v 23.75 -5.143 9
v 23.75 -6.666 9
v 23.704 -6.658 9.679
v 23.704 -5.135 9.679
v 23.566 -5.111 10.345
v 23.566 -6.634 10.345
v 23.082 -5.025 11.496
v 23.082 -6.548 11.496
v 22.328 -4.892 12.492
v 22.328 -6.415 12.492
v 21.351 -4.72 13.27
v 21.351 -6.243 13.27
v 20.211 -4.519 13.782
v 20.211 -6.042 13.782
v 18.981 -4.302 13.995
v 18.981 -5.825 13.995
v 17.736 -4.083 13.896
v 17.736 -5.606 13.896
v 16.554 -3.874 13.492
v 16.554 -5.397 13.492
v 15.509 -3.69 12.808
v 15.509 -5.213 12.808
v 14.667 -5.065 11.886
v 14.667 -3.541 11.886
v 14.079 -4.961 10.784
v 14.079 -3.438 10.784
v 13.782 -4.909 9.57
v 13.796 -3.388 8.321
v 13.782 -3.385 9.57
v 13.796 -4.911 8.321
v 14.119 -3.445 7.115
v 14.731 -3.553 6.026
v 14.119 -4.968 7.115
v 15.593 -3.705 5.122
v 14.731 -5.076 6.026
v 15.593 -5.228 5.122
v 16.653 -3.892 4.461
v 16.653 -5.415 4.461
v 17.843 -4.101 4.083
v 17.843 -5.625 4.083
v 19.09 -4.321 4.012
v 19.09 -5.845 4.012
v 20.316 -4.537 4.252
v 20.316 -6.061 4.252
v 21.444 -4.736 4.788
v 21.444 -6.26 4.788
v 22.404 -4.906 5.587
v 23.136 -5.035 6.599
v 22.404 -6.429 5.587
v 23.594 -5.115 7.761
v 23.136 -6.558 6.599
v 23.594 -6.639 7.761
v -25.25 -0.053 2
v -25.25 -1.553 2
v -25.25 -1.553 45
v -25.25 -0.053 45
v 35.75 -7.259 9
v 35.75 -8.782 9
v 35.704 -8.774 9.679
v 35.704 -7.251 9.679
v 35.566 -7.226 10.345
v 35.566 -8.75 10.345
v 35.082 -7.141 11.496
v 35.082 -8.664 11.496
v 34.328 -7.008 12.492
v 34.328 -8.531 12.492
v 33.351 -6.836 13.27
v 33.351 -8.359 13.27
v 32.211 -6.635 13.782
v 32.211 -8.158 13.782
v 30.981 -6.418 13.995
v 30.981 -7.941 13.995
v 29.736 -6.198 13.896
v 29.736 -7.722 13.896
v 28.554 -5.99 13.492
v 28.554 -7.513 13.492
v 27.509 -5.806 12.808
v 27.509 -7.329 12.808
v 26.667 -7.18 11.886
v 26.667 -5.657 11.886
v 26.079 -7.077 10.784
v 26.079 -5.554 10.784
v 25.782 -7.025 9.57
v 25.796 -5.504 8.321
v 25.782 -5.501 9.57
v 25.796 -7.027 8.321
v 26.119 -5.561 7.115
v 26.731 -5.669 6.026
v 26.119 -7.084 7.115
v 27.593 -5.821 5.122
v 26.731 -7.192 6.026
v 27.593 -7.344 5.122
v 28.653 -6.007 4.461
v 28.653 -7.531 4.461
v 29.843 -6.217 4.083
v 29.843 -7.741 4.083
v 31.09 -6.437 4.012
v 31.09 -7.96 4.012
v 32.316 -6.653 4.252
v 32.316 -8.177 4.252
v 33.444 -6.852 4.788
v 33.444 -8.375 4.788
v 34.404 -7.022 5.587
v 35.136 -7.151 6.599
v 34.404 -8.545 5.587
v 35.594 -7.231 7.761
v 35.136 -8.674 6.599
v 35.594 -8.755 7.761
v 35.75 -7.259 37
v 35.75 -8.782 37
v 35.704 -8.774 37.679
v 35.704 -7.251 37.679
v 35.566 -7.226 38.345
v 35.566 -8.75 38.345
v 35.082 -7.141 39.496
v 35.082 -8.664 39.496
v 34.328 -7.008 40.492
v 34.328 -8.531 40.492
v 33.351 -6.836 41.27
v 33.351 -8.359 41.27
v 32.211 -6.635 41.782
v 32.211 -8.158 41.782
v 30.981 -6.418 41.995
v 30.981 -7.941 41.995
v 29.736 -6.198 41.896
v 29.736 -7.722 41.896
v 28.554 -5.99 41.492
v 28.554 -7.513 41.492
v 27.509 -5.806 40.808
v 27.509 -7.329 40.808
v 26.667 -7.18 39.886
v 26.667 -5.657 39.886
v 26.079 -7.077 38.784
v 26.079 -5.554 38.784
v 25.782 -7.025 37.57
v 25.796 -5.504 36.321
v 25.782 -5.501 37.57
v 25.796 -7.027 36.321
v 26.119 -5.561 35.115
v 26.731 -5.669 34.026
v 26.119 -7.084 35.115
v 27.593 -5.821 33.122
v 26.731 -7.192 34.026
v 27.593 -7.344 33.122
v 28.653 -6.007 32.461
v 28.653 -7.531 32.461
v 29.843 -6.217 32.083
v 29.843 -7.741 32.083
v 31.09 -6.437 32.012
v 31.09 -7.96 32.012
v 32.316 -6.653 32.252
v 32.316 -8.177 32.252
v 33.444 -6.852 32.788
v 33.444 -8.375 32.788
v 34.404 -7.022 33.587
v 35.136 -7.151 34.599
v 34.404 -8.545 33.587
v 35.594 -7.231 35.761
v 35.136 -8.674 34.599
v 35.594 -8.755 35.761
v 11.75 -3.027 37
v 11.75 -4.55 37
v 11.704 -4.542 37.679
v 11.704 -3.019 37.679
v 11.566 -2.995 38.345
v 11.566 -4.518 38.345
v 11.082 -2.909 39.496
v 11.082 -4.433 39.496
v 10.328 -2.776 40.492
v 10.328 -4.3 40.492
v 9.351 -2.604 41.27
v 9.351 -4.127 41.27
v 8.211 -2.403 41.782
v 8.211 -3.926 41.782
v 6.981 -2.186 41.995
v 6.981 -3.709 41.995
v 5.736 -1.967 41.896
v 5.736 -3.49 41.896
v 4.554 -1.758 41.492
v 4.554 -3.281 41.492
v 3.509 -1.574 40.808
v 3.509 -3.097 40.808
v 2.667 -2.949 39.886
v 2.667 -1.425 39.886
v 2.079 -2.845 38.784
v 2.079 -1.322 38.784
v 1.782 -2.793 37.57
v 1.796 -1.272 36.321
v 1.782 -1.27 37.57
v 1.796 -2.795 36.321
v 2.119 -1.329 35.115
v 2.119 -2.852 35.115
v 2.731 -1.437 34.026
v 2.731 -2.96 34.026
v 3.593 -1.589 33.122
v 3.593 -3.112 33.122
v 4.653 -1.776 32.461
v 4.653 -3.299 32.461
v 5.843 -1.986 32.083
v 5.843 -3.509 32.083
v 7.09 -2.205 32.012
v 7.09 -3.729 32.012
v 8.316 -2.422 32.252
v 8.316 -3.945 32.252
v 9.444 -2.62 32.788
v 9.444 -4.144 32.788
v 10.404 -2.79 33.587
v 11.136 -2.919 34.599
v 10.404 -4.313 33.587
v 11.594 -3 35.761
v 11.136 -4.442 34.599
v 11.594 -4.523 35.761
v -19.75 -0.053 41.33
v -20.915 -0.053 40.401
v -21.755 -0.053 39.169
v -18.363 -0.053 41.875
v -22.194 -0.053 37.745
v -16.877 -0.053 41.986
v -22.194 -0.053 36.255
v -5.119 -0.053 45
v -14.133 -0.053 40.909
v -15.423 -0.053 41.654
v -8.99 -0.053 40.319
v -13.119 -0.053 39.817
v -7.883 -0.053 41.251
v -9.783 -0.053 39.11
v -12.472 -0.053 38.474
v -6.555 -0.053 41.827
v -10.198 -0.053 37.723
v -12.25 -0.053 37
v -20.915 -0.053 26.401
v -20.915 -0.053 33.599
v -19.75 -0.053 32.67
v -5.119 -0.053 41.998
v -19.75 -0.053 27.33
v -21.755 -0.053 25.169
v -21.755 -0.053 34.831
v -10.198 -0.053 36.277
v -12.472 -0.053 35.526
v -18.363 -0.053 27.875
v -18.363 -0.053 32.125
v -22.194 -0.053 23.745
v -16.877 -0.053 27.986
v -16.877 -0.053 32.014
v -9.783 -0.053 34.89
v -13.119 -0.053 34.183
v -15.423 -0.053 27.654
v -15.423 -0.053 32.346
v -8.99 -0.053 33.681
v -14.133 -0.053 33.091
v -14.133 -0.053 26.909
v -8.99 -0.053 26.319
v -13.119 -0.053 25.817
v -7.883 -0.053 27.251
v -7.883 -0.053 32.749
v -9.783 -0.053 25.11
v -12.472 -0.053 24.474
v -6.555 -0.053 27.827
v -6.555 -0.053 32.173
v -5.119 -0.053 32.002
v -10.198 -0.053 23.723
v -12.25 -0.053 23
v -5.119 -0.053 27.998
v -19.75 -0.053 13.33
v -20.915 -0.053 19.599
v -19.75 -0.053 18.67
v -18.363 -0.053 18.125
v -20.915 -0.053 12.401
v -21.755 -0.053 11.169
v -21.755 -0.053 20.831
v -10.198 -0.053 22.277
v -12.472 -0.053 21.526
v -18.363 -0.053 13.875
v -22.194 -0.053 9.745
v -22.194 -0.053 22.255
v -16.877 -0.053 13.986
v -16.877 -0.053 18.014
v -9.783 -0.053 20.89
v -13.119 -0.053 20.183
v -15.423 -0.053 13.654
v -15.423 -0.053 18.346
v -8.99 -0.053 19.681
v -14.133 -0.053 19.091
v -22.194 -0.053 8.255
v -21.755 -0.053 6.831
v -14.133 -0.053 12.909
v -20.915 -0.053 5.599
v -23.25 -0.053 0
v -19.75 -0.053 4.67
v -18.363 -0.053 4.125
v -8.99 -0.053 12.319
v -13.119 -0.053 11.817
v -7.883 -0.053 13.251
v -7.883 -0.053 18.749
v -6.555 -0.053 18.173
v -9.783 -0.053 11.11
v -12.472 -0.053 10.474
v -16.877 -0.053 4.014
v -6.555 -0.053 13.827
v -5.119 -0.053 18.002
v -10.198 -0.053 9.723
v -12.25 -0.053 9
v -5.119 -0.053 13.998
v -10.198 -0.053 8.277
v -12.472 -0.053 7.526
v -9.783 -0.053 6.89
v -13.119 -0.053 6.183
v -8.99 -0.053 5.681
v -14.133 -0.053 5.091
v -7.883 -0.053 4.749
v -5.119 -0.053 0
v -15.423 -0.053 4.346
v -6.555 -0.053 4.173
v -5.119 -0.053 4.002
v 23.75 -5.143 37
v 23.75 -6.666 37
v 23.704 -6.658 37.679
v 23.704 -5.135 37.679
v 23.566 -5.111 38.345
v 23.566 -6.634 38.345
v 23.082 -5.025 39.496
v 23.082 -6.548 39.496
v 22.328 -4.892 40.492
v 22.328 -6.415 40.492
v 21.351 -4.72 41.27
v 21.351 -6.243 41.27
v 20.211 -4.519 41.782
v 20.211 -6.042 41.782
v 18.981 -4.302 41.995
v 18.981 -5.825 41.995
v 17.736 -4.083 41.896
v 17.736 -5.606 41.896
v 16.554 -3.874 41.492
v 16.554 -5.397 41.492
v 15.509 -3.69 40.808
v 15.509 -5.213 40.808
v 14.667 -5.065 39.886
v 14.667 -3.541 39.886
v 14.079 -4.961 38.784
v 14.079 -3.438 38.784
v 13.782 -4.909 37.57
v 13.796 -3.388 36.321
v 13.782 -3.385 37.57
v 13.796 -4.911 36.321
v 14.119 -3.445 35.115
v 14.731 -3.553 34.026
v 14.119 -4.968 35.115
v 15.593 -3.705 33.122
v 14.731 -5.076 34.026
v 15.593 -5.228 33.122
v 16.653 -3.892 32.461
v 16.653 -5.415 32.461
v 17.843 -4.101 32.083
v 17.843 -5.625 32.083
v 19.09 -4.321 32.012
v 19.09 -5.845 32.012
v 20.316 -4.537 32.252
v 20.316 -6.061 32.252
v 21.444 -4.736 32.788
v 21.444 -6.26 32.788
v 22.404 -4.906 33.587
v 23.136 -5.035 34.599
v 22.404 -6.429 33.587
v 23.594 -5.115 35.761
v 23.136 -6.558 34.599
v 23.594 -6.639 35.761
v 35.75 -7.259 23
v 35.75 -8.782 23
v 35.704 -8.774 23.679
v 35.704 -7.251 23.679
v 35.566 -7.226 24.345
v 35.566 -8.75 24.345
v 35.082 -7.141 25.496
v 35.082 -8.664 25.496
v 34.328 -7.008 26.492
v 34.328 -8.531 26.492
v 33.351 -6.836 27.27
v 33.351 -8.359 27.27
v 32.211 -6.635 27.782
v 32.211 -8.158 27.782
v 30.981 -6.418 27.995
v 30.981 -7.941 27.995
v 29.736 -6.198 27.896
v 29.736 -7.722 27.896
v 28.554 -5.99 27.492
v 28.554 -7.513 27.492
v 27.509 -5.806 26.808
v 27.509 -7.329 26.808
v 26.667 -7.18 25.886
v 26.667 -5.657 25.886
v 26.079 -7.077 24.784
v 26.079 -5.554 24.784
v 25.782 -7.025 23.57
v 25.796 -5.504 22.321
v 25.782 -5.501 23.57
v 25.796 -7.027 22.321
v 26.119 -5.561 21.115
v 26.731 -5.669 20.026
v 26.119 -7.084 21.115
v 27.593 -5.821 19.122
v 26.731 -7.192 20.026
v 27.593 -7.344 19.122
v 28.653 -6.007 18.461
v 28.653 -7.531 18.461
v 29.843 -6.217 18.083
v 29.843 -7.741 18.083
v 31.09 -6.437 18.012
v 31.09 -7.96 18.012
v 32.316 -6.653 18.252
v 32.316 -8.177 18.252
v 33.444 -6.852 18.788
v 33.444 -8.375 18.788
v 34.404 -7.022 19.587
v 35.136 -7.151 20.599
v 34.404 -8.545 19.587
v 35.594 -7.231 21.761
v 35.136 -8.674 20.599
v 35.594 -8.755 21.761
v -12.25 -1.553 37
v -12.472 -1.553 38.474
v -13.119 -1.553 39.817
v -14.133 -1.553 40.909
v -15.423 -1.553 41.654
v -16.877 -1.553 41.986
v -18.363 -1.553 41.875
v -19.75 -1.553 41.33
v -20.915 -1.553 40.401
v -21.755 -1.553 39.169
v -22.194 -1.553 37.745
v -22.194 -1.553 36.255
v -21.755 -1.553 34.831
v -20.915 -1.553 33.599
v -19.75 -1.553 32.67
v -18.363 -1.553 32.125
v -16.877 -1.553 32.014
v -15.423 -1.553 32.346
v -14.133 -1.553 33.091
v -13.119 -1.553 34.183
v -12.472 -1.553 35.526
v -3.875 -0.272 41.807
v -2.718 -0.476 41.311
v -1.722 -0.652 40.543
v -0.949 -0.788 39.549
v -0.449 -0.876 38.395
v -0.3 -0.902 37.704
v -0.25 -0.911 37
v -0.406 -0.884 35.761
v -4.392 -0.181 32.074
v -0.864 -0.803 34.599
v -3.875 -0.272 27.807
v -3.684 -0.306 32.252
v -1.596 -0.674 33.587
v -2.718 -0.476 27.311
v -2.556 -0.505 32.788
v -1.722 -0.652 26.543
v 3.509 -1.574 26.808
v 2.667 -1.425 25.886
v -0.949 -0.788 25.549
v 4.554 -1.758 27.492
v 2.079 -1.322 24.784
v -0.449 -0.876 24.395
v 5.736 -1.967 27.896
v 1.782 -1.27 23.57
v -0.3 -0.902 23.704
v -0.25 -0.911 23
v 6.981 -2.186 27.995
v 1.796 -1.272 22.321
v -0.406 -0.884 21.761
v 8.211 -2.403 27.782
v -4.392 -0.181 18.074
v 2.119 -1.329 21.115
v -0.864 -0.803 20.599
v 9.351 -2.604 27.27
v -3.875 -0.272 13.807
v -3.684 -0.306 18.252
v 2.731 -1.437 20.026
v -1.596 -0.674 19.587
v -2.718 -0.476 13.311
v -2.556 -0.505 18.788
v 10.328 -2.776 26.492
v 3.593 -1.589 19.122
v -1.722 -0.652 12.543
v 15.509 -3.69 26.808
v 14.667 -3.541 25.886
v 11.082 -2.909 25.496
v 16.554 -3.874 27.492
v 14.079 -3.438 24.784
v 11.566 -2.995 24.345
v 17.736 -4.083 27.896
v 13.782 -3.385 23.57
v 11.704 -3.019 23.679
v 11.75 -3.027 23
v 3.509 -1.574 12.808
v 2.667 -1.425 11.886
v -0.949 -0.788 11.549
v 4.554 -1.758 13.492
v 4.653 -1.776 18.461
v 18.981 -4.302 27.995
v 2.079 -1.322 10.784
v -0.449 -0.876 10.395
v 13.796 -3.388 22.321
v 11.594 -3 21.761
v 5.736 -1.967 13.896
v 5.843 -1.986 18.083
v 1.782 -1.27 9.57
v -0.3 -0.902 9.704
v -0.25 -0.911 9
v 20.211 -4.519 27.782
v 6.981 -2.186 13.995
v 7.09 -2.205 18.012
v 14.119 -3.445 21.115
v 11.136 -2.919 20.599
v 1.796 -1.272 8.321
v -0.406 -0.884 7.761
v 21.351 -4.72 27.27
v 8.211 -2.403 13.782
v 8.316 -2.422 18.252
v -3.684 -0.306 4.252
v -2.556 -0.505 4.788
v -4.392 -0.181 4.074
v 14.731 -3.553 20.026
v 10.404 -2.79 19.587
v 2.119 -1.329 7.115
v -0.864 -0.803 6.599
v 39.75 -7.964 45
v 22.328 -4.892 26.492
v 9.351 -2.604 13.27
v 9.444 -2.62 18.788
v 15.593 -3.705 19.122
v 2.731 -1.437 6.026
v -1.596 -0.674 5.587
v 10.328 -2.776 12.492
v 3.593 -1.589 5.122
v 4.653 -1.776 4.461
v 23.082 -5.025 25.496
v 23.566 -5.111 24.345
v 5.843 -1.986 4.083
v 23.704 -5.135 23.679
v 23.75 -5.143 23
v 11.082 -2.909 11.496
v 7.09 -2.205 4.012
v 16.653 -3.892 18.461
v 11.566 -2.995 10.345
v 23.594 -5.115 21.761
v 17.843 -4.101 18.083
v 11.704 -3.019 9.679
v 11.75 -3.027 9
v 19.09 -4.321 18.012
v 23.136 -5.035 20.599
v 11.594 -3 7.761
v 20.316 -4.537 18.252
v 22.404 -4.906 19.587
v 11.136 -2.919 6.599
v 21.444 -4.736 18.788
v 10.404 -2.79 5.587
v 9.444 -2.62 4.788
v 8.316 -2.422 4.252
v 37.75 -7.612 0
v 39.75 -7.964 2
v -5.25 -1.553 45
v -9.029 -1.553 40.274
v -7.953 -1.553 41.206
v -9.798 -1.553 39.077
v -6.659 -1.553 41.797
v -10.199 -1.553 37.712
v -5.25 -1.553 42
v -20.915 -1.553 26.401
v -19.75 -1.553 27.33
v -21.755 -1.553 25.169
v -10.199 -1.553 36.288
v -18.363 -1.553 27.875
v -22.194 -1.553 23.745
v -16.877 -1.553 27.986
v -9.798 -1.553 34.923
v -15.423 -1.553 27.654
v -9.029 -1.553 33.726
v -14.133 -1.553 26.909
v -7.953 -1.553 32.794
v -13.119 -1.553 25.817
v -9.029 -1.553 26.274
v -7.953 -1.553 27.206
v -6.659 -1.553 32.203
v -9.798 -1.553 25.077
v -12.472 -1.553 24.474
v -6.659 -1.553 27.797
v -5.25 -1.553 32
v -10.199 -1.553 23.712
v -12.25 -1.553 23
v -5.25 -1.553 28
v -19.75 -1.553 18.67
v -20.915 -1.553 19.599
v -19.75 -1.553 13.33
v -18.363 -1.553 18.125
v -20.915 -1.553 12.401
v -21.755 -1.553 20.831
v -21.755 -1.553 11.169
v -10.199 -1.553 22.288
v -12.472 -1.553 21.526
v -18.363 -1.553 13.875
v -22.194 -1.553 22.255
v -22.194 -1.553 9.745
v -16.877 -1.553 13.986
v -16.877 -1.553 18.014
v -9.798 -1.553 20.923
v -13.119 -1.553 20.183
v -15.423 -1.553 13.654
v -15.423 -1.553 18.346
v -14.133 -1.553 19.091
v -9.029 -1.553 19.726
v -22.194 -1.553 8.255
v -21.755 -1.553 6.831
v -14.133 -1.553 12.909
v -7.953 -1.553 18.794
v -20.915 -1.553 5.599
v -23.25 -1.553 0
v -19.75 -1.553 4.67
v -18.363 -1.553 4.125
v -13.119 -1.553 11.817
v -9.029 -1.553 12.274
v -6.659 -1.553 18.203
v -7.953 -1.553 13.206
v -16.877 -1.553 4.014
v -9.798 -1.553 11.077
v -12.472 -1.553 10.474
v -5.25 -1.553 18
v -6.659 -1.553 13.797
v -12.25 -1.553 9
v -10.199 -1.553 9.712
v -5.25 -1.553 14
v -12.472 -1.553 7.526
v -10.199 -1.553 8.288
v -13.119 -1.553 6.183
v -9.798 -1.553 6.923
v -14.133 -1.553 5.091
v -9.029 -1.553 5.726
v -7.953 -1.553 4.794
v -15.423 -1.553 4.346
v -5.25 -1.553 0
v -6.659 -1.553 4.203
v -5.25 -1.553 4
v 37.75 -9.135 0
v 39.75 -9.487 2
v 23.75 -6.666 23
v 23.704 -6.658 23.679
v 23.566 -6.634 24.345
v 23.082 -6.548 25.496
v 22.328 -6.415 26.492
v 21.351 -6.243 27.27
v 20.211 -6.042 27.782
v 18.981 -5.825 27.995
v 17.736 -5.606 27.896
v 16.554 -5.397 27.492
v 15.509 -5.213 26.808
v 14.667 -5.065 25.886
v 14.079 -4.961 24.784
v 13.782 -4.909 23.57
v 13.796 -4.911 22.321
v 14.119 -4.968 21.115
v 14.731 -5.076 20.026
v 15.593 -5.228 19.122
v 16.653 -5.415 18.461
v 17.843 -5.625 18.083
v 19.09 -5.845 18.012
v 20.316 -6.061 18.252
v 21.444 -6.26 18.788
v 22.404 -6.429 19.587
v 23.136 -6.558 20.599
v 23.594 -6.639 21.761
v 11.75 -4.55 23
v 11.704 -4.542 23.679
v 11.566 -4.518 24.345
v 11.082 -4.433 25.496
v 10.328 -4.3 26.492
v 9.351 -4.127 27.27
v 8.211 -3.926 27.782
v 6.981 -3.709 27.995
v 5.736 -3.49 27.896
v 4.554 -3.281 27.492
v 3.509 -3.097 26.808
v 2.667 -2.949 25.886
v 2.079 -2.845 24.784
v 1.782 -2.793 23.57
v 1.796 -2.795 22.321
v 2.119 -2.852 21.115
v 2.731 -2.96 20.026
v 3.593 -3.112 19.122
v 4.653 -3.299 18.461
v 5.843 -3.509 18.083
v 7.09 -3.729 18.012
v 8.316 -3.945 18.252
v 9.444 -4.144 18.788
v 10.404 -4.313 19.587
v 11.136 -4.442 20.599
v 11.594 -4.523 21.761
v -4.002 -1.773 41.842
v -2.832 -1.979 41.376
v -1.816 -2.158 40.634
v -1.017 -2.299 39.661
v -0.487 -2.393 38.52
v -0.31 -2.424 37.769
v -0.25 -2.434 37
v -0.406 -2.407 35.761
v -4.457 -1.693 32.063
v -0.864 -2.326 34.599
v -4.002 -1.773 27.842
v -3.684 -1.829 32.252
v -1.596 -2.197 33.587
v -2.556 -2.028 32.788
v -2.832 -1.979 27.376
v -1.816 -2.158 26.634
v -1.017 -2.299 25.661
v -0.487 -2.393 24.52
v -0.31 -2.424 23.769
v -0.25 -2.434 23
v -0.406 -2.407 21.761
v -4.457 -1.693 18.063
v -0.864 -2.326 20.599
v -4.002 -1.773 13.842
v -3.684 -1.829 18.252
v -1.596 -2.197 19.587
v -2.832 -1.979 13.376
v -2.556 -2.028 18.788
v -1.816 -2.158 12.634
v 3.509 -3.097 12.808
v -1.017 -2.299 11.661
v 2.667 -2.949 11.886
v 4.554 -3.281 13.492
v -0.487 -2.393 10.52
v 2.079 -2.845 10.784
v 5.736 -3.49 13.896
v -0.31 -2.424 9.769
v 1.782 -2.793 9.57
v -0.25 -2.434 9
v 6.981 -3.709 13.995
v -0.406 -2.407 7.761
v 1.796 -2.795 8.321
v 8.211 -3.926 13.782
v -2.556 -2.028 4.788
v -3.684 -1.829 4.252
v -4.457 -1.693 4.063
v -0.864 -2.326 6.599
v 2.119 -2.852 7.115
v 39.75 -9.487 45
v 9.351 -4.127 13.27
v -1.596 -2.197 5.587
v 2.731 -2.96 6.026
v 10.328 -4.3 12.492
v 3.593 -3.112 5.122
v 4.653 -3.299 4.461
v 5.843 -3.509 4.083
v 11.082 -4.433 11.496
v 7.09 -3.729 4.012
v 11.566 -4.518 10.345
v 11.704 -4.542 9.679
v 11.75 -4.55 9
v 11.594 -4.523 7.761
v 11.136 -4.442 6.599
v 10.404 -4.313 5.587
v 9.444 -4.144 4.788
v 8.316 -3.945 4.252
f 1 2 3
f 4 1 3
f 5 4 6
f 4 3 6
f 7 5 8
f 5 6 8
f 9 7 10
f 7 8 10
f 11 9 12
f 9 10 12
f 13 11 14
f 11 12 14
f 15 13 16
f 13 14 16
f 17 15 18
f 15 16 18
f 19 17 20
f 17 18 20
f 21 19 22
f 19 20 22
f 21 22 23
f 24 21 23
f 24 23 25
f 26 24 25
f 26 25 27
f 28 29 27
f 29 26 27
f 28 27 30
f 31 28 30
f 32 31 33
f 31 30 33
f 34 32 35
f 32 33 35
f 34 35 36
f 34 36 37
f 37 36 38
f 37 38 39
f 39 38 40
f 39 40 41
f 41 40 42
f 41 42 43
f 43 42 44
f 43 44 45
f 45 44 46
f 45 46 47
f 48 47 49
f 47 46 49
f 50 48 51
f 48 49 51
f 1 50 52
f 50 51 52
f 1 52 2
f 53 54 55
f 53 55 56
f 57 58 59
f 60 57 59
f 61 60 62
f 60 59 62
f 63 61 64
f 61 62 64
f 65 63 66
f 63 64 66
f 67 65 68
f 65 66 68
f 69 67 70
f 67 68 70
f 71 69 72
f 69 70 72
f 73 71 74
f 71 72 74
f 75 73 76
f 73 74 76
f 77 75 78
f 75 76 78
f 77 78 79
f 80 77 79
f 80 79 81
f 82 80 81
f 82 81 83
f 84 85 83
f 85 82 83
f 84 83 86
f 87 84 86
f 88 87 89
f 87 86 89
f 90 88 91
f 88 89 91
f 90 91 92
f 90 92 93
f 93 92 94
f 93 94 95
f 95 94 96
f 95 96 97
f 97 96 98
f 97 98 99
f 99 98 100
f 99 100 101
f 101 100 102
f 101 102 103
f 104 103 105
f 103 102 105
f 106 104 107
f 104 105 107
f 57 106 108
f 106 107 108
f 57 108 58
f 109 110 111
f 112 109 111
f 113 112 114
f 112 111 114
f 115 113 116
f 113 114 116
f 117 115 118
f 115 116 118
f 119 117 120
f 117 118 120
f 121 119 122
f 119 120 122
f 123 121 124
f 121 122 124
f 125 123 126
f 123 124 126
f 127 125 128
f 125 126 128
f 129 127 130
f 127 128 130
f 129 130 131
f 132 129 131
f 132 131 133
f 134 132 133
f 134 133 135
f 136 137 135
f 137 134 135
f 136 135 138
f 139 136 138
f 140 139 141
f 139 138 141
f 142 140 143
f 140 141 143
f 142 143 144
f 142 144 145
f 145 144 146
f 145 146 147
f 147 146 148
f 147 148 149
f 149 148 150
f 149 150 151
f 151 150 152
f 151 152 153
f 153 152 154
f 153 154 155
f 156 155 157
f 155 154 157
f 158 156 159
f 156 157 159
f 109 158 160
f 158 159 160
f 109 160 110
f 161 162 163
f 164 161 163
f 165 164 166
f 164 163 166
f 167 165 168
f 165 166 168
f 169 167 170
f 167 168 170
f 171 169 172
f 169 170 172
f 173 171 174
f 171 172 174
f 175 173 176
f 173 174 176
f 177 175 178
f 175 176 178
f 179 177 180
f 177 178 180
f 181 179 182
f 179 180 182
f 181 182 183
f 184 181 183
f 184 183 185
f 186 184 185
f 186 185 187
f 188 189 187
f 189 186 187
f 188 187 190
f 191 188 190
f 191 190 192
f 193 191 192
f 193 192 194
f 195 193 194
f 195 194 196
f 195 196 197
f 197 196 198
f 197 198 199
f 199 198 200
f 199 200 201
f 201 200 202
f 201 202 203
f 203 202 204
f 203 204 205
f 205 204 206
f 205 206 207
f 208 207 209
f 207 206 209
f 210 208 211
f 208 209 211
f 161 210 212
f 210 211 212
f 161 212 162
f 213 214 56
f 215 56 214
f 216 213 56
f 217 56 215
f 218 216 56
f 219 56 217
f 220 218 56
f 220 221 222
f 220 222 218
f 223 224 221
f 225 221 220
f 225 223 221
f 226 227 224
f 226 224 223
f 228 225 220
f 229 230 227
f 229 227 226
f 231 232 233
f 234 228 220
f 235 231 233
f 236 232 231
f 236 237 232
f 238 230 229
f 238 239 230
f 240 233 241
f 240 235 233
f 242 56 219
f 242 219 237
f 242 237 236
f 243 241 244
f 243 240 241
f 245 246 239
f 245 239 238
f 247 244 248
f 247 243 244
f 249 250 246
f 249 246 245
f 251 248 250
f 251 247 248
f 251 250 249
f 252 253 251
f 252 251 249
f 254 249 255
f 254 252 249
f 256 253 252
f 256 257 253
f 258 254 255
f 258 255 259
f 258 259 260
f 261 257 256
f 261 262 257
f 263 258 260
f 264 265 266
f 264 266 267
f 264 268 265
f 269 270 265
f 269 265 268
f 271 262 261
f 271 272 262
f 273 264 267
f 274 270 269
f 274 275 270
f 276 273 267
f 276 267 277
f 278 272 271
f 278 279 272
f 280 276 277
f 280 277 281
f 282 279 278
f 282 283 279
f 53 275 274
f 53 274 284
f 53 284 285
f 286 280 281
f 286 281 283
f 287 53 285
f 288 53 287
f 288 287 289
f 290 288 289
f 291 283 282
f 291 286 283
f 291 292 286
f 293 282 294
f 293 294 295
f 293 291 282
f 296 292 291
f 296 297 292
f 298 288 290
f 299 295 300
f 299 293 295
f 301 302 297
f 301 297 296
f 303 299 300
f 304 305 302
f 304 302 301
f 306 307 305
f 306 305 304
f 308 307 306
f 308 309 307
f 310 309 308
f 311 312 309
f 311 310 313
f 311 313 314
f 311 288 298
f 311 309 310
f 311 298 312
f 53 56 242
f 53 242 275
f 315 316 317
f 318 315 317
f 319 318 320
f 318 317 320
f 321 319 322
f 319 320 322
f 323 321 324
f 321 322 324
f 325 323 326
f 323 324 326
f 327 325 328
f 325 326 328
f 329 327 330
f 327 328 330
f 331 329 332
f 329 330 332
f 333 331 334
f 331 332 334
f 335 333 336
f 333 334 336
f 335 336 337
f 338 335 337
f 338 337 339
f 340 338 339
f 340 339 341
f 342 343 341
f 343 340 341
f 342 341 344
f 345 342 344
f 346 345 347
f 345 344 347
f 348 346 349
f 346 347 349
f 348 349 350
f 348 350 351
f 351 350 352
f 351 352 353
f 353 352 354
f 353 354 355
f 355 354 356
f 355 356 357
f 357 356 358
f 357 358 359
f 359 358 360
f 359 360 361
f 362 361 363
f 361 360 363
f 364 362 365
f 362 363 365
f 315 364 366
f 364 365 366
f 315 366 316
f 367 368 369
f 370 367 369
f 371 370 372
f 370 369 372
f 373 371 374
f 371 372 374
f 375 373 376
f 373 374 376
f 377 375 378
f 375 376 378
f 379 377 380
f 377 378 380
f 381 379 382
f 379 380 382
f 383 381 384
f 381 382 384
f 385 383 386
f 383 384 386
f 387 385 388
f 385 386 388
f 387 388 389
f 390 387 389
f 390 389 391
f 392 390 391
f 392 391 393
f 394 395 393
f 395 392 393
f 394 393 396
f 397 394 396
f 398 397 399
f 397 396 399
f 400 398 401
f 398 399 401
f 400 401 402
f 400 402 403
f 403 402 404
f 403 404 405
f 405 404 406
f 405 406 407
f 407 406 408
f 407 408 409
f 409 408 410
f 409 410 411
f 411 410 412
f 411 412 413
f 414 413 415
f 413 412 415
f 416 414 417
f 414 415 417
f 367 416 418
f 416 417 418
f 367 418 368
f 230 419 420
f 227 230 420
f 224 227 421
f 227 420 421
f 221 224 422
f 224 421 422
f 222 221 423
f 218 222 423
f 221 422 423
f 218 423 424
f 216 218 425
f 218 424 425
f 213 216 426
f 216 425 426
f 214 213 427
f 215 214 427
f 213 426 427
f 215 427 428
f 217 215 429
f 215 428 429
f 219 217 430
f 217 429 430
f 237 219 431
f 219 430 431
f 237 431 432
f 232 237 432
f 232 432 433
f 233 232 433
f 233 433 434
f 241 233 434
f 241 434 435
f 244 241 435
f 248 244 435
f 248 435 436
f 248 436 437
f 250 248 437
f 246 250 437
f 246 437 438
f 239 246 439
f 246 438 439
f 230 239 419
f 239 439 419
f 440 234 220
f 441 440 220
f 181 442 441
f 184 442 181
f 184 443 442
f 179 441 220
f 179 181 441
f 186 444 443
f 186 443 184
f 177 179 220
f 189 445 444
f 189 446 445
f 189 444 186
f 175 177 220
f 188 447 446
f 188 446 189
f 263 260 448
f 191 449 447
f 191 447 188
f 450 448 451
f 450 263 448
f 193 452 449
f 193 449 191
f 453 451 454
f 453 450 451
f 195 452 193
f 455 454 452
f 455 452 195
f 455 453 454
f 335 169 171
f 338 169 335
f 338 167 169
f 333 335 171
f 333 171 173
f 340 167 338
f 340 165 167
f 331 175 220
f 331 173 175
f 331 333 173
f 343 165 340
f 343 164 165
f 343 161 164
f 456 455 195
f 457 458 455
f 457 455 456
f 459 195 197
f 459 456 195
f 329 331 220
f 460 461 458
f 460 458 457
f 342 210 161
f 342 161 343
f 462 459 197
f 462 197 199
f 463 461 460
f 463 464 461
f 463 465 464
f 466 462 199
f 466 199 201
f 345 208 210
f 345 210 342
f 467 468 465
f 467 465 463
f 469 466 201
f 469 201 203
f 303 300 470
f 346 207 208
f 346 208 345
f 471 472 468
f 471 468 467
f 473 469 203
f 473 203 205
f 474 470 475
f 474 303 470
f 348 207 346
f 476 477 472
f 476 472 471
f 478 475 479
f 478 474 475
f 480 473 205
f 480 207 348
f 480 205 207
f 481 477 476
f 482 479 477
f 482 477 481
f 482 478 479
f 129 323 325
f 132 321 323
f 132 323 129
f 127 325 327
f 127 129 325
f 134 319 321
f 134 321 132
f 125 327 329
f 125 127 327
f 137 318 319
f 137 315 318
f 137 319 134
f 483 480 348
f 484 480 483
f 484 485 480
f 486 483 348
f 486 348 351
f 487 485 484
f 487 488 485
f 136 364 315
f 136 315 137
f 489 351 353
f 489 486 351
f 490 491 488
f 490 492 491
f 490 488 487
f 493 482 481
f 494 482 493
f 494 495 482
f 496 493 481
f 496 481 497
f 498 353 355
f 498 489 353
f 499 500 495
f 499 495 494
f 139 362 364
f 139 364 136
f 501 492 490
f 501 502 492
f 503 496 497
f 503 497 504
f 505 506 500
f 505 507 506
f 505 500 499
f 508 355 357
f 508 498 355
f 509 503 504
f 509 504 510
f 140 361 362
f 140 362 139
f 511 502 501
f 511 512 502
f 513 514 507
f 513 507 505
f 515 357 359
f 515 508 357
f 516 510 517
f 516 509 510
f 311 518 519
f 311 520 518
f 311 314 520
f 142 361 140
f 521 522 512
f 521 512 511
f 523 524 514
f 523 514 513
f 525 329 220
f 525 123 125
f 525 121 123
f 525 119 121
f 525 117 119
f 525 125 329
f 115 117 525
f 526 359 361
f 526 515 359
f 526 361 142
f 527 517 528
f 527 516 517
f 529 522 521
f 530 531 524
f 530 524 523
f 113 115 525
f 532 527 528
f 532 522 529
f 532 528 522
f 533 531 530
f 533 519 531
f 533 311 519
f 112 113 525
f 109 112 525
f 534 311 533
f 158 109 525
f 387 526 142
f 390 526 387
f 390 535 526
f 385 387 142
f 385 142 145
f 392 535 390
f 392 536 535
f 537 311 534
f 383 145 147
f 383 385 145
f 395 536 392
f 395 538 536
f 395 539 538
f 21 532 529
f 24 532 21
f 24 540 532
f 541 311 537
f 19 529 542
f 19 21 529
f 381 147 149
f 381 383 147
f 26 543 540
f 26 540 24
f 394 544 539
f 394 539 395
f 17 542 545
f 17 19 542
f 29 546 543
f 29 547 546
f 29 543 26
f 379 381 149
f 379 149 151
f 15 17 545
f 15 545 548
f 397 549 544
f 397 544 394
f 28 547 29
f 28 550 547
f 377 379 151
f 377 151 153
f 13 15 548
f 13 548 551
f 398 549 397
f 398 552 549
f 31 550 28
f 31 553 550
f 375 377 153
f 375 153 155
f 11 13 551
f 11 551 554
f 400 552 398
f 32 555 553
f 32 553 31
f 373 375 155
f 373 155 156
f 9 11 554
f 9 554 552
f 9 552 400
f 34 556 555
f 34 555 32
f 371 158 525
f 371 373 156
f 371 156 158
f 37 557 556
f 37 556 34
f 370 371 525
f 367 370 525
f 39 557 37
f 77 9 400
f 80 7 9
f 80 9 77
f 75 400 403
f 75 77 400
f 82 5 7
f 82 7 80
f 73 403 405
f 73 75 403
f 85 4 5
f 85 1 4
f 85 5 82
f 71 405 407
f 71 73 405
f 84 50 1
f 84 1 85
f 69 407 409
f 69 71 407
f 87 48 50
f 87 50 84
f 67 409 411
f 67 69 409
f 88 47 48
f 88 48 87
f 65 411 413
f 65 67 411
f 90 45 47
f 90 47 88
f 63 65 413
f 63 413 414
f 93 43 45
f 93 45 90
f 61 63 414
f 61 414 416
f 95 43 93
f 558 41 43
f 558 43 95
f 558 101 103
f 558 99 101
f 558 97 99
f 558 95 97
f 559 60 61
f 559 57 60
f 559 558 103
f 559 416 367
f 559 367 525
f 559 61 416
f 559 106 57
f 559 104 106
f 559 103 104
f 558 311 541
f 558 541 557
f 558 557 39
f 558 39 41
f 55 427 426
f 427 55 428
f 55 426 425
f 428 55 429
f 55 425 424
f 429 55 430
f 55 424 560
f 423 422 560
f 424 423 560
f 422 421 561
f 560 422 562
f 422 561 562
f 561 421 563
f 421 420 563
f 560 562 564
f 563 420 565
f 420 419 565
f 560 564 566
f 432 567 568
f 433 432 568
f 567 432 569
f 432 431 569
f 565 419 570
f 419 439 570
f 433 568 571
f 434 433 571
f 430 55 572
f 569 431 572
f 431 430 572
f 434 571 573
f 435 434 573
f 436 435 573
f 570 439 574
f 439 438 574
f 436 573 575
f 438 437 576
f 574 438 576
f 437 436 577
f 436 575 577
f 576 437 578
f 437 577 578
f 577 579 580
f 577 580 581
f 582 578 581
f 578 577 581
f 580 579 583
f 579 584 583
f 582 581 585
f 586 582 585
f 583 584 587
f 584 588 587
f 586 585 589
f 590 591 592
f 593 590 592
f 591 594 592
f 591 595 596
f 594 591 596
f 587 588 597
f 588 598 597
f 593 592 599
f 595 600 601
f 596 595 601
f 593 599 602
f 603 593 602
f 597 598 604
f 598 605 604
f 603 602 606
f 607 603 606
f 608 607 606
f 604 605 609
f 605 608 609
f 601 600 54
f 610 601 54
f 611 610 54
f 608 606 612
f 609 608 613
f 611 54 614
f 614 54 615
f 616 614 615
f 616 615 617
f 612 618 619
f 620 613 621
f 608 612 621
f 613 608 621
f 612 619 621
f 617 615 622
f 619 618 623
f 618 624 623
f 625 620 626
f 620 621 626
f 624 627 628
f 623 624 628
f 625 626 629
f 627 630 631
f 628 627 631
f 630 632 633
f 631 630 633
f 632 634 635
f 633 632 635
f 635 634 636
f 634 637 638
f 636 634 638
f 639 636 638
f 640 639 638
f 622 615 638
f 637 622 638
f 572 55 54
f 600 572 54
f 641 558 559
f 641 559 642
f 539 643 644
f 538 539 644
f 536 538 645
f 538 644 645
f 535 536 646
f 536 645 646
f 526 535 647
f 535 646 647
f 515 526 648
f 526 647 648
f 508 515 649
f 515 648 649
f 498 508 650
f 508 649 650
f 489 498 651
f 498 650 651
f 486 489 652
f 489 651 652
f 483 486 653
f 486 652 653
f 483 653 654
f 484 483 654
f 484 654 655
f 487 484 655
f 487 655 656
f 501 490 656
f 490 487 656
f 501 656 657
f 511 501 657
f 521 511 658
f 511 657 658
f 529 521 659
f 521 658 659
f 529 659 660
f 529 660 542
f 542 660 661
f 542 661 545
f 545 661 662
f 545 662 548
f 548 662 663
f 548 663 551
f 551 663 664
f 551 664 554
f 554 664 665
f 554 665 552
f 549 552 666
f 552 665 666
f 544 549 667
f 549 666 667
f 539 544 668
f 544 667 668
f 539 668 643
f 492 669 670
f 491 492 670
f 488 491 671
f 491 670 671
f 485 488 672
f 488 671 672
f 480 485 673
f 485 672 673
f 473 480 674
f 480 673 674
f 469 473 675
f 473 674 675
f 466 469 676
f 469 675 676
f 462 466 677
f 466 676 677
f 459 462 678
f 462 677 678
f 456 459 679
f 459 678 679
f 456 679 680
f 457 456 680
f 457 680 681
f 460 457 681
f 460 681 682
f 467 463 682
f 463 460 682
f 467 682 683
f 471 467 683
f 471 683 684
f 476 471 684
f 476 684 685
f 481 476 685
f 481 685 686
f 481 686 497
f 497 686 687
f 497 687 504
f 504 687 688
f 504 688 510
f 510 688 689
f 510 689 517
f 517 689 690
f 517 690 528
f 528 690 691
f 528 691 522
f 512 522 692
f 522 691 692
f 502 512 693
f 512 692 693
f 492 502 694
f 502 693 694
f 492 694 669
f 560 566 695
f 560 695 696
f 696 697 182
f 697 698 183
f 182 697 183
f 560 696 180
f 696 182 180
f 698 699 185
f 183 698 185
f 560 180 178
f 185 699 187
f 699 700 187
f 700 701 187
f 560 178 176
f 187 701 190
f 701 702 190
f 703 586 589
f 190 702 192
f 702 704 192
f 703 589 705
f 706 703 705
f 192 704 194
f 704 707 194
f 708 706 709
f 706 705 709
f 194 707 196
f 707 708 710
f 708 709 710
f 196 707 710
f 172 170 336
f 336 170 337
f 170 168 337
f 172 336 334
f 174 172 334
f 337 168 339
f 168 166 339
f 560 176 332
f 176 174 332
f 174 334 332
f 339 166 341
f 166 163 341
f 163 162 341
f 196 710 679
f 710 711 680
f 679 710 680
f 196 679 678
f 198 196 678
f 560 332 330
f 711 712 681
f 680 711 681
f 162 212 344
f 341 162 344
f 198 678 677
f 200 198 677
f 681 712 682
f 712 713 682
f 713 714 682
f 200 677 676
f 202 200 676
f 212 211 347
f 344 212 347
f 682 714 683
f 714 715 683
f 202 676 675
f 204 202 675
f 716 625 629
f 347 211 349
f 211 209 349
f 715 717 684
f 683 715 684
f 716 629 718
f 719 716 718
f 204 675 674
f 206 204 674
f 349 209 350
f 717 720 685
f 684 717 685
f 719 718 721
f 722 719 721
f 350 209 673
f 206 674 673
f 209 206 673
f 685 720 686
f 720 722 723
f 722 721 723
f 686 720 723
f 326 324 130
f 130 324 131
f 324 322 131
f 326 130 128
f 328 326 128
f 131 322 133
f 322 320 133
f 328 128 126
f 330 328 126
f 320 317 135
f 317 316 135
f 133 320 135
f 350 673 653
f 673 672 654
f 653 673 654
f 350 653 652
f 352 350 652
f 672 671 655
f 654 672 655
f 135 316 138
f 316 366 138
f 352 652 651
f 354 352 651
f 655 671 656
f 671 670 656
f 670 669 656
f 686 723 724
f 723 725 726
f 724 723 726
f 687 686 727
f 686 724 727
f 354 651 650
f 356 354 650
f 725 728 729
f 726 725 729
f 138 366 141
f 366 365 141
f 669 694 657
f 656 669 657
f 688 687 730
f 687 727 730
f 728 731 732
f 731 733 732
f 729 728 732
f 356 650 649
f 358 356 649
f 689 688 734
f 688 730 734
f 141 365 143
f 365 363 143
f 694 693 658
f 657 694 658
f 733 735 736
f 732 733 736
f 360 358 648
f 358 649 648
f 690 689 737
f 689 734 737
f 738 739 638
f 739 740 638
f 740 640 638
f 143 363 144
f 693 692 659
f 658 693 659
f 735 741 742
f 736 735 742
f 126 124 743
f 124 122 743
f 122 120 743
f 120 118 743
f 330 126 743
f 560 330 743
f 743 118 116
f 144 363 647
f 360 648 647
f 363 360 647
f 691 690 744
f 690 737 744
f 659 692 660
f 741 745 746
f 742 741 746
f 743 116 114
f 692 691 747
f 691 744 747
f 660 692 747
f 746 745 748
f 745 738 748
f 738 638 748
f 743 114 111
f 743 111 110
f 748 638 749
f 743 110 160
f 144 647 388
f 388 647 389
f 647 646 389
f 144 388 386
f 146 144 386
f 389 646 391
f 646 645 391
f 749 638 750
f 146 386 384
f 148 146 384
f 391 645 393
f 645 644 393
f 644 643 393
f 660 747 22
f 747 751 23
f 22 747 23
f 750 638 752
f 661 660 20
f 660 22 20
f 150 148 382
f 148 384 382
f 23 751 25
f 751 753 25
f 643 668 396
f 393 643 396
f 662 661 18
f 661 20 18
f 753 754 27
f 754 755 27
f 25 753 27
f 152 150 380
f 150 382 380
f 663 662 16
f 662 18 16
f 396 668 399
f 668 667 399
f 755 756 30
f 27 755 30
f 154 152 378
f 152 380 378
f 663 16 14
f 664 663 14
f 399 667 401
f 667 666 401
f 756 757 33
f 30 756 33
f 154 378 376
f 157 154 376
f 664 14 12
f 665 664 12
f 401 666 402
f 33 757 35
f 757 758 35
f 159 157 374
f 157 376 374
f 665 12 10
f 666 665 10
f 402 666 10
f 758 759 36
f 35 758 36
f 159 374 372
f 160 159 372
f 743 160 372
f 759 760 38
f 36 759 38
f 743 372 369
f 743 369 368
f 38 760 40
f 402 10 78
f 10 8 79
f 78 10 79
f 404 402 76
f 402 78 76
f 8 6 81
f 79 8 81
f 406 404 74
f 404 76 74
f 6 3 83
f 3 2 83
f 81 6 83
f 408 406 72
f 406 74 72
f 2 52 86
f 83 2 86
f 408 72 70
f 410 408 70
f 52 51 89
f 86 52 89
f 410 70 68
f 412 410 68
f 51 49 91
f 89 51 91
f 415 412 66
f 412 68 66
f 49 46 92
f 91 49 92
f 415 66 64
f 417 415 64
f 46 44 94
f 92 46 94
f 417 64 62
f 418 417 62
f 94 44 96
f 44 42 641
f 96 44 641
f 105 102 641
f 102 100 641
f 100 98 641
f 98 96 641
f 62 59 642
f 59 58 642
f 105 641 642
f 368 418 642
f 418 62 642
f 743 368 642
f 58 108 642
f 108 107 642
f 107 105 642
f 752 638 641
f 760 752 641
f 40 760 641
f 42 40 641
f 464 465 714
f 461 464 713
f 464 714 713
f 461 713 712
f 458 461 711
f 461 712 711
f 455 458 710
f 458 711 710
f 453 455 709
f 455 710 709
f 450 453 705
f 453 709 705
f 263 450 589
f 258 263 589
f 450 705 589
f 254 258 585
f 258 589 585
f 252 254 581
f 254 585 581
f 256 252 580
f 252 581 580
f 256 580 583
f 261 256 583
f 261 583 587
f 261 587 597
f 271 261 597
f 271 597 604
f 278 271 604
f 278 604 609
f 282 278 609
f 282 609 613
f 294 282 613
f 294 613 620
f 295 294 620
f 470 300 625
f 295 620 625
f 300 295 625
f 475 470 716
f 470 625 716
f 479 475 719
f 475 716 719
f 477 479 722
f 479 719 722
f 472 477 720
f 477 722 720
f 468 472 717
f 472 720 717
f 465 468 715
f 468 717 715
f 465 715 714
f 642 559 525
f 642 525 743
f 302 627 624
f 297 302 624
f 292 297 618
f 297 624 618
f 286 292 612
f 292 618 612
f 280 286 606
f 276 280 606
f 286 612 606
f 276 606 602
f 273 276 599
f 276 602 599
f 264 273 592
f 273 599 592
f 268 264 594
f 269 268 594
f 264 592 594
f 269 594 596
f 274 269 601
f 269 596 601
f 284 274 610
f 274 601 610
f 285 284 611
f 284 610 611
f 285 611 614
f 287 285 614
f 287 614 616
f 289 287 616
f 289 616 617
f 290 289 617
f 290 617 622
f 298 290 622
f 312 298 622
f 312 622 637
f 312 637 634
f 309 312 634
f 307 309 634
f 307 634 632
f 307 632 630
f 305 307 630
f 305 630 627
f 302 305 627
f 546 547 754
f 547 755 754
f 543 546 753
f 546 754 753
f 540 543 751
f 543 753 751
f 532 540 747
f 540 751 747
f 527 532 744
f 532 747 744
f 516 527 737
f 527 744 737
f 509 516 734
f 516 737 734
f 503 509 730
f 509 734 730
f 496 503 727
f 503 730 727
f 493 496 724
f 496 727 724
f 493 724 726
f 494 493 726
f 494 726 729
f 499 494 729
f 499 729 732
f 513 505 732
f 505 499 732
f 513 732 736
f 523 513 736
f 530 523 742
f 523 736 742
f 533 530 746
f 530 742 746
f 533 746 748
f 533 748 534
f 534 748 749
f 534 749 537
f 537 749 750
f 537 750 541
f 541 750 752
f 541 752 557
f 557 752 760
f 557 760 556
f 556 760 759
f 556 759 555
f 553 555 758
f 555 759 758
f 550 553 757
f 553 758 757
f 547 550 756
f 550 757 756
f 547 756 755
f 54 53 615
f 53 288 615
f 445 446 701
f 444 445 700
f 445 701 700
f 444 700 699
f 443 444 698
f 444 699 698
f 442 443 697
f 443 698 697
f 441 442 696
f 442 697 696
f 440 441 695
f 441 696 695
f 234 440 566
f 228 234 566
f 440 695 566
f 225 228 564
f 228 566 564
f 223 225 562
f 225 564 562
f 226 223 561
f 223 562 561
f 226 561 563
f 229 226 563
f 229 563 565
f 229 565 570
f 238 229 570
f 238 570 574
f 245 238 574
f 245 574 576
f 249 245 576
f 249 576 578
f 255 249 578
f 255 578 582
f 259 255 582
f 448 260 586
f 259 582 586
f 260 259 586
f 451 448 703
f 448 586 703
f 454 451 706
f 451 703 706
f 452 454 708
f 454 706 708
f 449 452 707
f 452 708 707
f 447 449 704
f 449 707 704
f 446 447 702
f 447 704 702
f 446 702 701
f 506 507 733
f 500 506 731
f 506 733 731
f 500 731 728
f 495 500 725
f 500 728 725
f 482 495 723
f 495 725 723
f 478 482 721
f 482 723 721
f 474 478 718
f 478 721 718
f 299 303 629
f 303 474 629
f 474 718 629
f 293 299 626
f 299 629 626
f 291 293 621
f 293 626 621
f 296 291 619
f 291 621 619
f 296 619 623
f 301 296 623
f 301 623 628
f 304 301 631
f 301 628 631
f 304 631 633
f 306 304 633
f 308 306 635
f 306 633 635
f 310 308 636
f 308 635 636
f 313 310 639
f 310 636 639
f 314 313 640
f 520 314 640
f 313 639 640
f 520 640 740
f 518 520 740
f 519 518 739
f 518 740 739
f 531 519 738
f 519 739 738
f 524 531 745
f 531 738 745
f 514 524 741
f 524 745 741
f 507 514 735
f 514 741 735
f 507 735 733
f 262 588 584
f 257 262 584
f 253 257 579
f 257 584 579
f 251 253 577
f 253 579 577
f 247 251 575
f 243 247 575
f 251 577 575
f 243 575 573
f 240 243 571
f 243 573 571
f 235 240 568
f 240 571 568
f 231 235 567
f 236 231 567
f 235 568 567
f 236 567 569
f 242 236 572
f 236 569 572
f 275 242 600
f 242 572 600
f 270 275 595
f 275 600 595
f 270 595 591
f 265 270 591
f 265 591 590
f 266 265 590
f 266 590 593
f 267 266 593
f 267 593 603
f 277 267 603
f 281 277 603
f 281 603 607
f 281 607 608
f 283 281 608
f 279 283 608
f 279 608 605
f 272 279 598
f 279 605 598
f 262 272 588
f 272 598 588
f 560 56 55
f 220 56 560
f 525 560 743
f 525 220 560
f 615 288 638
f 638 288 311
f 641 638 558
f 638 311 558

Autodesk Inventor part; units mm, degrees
ref_plane "YZ Plane" through (0, 0, 0) normal (1, 0, 0) x (0, 1, 0)
ref_plane "XZ Plane" through (0, 0, 0) normal (0, 1, 0) x (-1, 0, 0)
sketch "Sketch1" plane through (0, 0, 0) normal (0, 0, 1) x (1, 0, 0)
  line L0 (-25.2502, -1.5527) -> (-5.2502, -1.5527)
  line L1 (-5.2502, -1.5527) -> (39.7498, -9.4874)
  line L2 (-25.2502, -1.5527) -> (-25.2502, -0.0527)
  line L3 (-25.2502, -0.0527) -> (-5.1189, -0.0527)
  line L4 (-5.1189, -0.0527) -> (39.7498, -7.9642)
  line L5 (39.7498, -7.9642) -> (39.7498, -9.4874)
  point P0 (0, 0)
  dimension "d1" = 170
  dimension "d2" = 1.5
  dimension "d3" = 1.5
  dimension "d4" = 65
  dimension "d7" = 20
extrude "Extrusion1" add sketch "Sketch1" along normal blind 45
ref_plane "Work Plane1" through (-25.2502, -11.5527, 0) normal (0, -1, 0) x (1, 0, 0)
sketch "Sketch2" plane through (-25.2502, -11.5527, 0) normal (0, -1, 0) x (1, 0, 0)
  line L0 (20, 0) -> (65, 0) projected
  line L1 (65, 0) -> (65, 45) projected
  line L2 (20, 45) -> (65, 45) projected
  line L3 (20, 0) -> (20, 45) projected
  line L4 (0, 0) -> (20, 0) projected
  line L5 (20, 0) -> (20, 45) projected
  line L6 (0, 45) -> (20, 45) projected
  line L7 (0, 0) -> (0, 45) projected
  circle A0 centre (8, 37) radius 5
  circle A1 centre (8, 23) radius 5
  circle A2 centre (8, 9) radius 5
  circle A3 centre (20, 37) radius 5
  circle A4 centre (20, 23) radius 5
  circle A5 centre (20, 9) radius 5
  circle A6 centre (32, 37) radius 5
  circle A7 centre (32, 23) radius 5
  circle A8 centre (32, 9) radius 5
  circle A9 centre (44, 37) radius 5
  circle A10 centre (44, 23) radius 5
  circle A11 centre (44, 9) radius 5
  circle A12 centre (56, 37) radius 5
  circle A13 centre (56, 23) radius 5
  circle A14 centre (56, 9) radius 5
  point P0 (25.2502, 0)
  dimension "d9" = 10
  dimension "d10" = 8
  dimension "d11" = 8
  dimension "d14" = 14
  dimension "d17" = 12
extrude "Extrusion2" cut sketch "Sketch2" against normal through all contours A5 L3 | L3 A5 | A4 L3 | L3 A4 | A3 L3 | L3 A3 | A0 | A1 | A2 | A6 | A7 | A8 | A9 | A10 | A11 | A12 | A13 | A14
chamfer "Chamfer1" distance 2 angle 45 2 edges at (-25.2502, -0.8027, 0) (39.7498, -8.7258, 0)
equation "\"d3\" = d2"
equation "\"d11\" = d10"
properties part number "CNCM_ALU_Second_sieve" material "Aluminum 6061"
